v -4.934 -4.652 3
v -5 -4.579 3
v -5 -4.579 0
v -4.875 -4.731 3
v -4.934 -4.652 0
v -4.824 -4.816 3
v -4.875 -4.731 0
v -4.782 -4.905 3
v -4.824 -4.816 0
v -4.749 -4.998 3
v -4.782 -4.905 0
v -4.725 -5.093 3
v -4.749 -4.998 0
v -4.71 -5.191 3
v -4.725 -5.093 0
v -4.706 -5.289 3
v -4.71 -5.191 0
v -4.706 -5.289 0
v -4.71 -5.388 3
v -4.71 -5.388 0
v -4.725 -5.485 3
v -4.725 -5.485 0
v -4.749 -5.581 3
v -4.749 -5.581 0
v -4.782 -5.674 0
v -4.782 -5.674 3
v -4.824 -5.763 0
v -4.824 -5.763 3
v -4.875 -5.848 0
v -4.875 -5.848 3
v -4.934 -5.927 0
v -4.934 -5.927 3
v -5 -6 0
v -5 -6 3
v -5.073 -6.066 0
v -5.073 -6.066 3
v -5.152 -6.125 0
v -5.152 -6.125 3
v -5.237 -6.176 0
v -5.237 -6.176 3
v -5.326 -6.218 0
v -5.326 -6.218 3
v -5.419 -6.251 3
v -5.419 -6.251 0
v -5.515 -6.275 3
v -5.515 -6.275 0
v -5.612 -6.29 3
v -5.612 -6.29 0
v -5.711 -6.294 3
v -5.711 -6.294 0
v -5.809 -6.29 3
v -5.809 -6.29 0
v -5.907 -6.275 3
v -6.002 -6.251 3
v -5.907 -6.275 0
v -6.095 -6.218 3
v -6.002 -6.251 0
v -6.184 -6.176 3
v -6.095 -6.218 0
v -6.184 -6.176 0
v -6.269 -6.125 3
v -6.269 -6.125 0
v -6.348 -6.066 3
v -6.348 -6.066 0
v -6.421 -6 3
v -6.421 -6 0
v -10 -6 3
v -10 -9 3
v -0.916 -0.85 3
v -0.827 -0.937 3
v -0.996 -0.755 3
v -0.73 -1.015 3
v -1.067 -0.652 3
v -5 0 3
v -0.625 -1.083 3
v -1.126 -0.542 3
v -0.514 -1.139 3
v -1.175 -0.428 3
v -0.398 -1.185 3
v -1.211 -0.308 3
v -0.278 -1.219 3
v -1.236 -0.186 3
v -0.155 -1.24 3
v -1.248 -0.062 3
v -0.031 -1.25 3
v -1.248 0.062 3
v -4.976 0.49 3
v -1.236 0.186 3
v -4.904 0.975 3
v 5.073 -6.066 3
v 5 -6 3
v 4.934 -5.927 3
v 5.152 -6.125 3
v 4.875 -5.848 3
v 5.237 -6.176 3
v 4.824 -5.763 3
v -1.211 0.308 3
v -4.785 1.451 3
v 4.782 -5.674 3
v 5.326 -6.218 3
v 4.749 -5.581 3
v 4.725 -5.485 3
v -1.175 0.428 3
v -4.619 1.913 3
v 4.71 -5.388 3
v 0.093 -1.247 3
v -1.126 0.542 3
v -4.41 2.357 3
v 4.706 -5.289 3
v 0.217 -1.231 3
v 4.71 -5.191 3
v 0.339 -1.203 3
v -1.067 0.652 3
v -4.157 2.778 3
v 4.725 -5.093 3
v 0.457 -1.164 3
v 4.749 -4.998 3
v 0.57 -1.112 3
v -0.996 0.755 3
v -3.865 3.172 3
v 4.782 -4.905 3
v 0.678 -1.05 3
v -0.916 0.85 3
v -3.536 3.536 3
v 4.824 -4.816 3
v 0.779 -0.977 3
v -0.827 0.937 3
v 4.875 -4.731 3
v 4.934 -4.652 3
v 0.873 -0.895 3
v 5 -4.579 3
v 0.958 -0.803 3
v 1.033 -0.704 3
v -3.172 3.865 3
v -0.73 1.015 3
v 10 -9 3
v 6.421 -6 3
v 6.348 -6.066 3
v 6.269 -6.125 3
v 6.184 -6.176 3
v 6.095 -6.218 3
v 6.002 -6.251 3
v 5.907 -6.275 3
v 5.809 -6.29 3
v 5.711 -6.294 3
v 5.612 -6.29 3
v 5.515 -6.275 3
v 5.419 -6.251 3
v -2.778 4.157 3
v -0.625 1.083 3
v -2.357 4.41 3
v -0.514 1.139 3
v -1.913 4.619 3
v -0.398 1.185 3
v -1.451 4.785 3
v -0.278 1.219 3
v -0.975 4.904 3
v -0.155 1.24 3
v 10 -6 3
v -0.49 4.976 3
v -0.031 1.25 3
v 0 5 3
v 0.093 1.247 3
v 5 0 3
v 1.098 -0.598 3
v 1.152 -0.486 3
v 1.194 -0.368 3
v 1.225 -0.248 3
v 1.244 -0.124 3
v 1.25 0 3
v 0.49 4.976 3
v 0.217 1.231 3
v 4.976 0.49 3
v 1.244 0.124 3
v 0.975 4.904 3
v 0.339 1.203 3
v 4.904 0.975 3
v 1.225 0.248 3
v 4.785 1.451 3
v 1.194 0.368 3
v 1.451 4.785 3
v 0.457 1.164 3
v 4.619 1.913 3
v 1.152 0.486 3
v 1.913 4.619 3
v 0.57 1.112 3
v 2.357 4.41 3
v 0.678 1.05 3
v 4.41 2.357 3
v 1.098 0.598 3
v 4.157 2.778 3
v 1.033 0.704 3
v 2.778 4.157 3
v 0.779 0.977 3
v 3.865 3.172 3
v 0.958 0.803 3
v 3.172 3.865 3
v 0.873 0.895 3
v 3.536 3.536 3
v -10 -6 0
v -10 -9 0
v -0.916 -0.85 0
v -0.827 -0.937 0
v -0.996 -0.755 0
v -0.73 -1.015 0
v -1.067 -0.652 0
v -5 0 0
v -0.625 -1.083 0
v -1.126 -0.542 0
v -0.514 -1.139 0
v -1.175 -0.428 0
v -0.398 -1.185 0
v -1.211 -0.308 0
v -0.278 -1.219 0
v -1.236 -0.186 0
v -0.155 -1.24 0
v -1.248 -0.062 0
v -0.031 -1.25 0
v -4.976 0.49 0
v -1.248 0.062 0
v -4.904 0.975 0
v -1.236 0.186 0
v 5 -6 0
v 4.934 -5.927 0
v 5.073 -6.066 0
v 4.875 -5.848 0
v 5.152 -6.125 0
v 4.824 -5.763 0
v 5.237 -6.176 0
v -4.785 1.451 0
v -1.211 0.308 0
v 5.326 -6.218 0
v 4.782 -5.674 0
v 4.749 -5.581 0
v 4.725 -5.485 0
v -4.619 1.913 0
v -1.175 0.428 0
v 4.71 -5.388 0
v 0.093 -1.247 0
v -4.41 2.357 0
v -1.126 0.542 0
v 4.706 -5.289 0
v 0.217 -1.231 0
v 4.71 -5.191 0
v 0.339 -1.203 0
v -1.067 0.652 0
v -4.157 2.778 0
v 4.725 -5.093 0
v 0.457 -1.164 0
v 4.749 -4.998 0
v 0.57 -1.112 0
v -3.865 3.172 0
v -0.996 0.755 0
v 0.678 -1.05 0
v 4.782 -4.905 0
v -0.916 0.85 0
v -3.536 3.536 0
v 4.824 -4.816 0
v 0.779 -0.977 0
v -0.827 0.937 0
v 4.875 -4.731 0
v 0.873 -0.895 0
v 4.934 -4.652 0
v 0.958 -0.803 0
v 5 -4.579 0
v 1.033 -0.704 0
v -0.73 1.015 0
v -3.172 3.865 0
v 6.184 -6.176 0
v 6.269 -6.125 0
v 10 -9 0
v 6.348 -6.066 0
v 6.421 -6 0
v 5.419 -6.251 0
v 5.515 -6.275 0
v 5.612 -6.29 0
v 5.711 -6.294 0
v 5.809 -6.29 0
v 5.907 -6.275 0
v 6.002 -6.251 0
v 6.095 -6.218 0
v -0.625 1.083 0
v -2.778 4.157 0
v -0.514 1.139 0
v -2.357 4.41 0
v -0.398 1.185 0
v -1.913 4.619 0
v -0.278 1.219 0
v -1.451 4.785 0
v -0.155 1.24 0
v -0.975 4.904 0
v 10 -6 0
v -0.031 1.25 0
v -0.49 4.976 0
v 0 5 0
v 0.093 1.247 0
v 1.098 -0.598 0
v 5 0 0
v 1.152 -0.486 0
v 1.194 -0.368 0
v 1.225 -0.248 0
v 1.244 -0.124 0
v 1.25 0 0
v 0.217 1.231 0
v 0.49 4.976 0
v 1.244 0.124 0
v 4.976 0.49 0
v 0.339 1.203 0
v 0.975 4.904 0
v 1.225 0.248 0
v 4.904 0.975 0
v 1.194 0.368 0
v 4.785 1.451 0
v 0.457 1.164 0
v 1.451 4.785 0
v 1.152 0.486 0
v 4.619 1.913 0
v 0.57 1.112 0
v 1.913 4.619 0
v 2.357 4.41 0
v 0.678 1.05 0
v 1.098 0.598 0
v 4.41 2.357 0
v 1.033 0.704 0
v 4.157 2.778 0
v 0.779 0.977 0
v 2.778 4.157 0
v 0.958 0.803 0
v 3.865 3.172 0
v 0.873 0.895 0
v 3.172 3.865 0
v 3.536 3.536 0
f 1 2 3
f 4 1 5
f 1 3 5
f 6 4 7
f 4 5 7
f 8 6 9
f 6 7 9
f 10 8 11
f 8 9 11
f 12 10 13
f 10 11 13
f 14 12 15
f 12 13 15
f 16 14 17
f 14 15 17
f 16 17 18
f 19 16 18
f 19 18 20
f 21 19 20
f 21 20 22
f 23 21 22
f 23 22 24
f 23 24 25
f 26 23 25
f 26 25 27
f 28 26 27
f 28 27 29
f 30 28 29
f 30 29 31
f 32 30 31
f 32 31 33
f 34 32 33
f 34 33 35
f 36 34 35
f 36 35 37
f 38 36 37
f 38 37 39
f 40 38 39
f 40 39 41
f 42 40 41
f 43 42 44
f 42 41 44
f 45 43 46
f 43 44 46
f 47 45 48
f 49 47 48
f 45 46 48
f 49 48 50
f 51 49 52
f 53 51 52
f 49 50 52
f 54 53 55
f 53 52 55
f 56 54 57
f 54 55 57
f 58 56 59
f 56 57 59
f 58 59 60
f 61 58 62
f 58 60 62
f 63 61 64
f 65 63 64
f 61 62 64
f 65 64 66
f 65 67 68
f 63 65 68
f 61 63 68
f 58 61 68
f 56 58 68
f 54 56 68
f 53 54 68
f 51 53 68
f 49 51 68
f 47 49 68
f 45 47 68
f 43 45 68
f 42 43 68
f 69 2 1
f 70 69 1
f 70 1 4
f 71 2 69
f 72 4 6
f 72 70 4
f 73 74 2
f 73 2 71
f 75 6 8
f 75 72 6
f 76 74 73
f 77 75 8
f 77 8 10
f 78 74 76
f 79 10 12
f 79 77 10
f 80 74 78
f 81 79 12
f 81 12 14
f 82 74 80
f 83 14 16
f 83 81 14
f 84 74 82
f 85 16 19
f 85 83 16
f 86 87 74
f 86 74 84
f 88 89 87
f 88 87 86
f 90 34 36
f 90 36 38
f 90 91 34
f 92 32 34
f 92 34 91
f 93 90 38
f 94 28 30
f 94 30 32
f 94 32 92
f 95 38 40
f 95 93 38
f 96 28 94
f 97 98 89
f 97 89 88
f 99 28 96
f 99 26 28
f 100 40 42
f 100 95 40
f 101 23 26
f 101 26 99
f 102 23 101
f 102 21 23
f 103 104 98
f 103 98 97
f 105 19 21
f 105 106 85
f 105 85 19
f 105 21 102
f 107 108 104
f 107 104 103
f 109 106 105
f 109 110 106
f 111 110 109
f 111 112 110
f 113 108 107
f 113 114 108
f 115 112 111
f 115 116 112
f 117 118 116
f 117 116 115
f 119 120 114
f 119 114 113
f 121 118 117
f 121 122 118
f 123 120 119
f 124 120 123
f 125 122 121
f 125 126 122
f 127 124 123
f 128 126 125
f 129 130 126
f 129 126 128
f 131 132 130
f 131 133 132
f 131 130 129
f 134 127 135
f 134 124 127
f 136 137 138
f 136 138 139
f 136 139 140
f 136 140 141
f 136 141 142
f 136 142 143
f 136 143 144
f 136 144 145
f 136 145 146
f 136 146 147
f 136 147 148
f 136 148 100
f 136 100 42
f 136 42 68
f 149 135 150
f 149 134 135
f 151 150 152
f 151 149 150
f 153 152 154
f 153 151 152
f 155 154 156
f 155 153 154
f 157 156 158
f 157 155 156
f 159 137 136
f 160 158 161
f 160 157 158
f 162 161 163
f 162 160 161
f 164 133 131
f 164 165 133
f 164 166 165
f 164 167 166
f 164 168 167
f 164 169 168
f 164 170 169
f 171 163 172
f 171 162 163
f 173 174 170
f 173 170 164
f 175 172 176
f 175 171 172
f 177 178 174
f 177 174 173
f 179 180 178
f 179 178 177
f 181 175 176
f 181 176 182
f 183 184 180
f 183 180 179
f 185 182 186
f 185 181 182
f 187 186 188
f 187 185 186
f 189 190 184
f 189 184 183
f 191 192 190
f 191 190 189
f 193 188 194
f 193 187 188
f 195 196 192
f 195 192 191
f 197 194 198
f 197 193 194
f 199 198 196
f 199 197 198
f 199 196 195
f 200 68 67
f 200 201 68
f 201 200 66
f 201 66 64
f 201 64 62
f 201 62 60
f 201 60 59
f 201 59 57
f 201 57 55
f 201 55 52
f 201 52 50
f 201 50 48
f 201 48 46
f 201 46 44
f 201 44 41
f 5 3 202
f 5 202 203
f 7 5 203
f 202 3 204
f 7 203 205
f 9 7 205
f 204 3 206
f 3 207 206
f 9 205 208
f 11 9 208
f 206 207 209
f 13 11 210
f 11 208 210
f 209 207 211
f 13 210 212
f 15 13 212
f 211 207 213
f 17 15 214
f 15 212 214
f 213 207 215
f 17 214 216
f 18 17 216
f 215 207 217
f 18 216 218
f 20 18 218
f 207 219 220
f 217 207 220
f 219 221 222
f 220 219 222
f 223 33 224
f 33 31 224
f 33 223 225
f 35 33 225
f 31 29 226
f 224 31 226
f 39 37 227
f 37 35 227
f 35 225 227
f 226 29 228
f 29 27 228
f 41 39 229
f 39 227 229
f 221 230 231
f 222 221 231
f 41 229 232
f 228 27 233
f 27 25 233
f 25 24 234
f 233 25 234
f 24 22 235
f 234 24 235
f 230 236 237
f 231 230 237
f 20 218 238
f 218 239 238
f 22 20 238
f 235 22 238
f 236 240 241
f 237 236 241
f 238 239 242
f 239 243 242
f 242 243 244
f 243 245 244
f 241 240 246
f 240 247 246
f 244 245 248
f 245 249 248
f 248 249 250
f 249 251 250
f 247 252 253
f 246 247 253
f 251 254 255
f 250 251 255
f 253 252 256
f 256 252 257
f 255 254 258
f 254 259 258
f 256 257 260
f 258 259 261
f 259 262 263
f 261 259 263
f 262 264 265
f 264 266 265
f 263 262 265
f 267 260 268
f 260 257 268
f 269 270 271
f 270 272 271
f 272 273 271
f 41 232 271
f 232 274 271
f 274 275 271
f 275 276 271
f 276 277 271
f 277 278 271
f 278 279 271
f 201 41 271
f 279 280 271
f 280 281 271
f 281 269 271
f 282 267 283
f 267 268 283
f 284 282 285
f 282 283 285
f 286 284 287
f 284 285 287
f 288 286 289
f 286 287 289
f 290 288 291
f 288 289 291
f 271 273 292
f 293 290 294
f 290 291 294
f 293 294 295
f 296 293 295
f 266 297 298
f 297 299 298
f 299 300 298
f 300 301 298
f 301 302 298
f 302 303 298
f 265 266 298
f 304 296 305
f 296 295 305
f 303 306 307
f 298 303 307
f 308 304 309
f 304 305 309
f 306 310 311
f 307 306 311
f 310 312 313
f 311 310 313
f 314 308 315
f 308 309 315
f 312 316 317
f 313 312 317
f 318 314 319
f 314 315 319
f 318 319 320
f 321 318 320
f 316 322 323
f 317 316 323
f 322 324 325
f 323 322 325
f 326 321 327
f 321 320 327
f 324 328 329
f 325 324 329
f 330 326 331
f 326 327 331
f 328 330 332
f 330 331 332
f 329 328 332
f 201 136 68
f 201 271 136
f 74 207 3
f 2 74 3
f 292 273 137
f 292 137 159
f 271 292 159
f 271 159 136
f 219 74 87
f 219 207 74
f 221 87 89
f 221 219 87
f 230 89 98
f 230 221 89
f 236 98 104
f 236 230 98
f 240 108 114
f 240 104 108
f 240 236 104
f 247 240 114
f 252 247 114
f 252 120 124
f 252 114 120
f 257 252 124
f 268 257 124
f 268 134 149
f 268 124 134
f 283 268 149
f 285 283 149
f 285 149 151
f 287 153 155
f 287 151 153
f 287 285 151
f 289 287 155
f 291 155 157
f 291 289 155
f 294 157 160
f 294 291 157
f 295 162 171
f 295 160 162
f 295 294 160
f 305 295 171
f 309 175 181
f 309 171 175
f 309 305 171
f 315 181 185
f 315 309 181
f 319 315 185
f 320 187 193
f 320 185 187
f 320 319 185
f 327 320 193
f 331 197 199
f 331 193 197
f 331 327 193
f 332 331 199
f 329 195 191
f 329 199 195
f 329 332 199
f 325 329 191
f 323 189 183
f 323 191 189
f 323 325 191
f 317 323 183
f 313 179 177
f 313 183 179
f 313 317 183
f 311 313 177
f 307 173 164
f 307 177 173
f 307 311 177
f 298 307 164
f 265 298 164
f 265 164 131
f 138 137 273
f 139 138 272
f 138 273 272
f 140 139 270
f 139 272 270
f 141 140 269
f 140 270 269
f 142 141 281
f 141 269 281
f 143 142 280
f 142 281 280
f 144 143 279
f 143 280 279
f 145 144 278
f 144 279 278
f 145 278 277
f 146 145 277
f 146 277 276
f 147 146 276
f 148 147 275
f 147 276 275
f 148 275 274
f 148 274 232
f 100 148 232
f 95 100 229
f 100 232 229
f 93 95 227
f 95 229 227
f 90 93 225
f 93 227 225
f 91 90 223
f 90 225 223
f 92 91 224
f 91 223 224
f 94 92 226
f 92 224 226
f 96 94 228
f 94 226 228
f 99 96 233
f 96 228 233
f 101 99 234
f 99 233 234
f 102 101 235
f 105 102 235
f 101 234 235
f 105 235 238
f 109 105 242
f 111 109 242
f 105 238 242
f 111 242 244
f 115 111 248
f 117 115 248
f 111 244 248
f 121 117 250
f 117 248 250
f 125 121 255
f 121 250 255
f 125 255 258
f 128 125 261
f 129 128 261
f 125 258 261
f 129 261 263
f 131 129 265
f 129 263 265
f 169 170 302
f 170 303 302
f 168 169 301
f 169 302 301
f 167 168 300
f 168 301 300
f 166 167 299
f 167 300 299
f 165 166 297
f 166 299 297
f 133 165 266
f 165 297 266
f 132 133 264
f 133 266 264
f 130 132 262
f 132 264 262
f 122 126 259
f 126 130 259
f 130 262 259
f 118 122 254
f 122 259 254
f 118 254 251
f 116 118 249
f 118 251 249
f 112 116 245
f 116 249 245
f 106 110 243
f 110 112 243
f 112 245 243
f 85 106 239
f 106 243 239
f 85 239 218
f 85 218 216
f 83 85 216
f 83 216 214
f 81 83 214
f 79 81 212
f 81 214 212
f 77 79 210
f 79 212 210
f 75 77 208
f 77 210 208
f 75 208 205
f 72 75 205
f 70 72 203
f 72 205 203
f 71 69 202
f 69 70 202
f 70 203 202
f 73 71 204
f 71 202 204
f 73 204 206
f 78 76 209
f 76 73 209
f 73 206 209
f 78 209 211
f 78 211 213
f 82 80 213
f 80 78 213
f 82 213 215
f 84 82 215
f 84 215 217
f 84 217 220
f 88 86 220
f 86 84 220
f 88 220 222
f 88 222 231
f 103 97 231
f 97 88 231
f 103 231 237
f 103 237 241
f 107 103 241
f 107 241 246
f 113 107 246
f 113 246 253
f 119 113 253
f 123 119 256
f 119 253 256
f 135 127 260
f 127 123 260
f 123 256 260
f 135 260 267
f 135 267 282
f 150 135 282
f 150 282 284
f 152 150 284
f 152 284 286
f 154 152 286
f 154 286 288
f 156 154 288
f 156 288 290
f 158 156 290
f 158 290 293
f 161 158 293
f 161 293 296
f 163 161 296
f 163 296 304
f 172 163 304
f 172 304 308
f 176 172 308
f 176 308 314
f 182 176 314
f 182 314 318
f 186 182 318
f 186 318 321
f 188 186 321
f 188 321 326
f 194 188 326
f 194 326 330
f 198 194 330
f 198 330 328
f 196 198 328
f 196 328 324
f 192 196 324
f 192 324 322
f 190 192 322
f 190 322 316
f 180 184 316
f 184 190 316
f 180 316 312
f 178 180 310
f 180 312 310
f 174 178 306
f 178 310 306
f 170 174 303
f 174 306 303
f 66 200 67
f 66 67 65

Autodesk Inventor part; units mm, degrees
ref_plane "YZ Plane" through (0, 0, 0) normal (1, 0, 0) x (0, 1, 0)
ref_plane "XZ Plane" through (0, 0, 0) normal (0, 1, 0) x (-1, 0, 0)
ref_plane "XY Plane" through (0, 0, 0) normal (0, 0, 1) x (1, 0, 0)
sketch "スケッチ1" plane through (0, 0, 0) normal (0, 0, 1) x (1, 0, 0)
  circle A0 centre (0, 0) radius 1.25
  circle A1 centre (0, 0) radius 5
  line L0 (-10, -6) -> (10, -6)
  line L1 (10, -6) -> (10, -9)
  line L2 (10, -9) -> (-10, -9)
  line L3 (-10, -9) -> (-10, -6)
  line L4 (-5, 0) -> (-5, -6)
  line L5 (5, 0) -> (5, -6)
  circle A2 centre (-5.7106, -5.2894) radius 1.005
  circle A3 centre (5.7106, -5.2894) radius 1.005
  line L6 (-5.7106, -5.2894) -> (-5, -6)
  line L7 (5.7106, -5.2894) -> (5, -6)
  point P0 (6.4213, -6)
  point P1 (5, -4.5787)
  point P2 (-5, -4.5787)
  point P3 (-6.4213, -6)
  dimension "d7" = 2.01
  dimension "d8" = 2.01
  dimension "d0" = 2.5
  dimension "d1" = 10
  dimension "d2" = 3
  dimension "d3" = 20
  dimension "d4" = 6
  dimension "d5" = 5
  dimension "d6" = 6
  dimension "d9" = 45
  dimension "d10" = 45
extrude "押し出し1" add sketch "スケッチ1" along normal blind 3 contours A1 | L5 A3 L0 A2 L4 A1 | A3 L0 L1 L2 L3 A2
thread "ねじ1" size "M3x0.5" class "6H" standard "ANSI Metric M Profile" full length
sketch "スケッチ2" plane through (0, 0, 3) normal (0, 0, 1) x (1, 0, 0)
  line L0 (-10, -6) -> (-10, -9) projected
  line L1 (-10, -9) -> (10, -9) projected
  line L2 (10, -9) -> (10, -6) projected
  line L3 (10, -6) -> (6.4213, -6) projected
  arc A0 (5, -4.5787) -> (6.4213, -6) centre (5.7106, -5.2894) ccw projected
  line L4 (5, -4.5787) -> (5, 0) projected
  arc A1 (5, 0) -> (-5, 0) centre (0, 0) ccw projected
  line L5 (-5, 0) -> (-5, -4.5787) projected
  arc A2 (-6.4213, -6) -> (-5, -4.5787) centre (-5.7106, -5.2894) ccw projected
  line L6 (-6.4213, -6) -> (-10, -6) projected
  circle A3 centre (0, 0) radius 1.25 projected
properties part number "T字金具M3" material "アルミニウム 7075"
